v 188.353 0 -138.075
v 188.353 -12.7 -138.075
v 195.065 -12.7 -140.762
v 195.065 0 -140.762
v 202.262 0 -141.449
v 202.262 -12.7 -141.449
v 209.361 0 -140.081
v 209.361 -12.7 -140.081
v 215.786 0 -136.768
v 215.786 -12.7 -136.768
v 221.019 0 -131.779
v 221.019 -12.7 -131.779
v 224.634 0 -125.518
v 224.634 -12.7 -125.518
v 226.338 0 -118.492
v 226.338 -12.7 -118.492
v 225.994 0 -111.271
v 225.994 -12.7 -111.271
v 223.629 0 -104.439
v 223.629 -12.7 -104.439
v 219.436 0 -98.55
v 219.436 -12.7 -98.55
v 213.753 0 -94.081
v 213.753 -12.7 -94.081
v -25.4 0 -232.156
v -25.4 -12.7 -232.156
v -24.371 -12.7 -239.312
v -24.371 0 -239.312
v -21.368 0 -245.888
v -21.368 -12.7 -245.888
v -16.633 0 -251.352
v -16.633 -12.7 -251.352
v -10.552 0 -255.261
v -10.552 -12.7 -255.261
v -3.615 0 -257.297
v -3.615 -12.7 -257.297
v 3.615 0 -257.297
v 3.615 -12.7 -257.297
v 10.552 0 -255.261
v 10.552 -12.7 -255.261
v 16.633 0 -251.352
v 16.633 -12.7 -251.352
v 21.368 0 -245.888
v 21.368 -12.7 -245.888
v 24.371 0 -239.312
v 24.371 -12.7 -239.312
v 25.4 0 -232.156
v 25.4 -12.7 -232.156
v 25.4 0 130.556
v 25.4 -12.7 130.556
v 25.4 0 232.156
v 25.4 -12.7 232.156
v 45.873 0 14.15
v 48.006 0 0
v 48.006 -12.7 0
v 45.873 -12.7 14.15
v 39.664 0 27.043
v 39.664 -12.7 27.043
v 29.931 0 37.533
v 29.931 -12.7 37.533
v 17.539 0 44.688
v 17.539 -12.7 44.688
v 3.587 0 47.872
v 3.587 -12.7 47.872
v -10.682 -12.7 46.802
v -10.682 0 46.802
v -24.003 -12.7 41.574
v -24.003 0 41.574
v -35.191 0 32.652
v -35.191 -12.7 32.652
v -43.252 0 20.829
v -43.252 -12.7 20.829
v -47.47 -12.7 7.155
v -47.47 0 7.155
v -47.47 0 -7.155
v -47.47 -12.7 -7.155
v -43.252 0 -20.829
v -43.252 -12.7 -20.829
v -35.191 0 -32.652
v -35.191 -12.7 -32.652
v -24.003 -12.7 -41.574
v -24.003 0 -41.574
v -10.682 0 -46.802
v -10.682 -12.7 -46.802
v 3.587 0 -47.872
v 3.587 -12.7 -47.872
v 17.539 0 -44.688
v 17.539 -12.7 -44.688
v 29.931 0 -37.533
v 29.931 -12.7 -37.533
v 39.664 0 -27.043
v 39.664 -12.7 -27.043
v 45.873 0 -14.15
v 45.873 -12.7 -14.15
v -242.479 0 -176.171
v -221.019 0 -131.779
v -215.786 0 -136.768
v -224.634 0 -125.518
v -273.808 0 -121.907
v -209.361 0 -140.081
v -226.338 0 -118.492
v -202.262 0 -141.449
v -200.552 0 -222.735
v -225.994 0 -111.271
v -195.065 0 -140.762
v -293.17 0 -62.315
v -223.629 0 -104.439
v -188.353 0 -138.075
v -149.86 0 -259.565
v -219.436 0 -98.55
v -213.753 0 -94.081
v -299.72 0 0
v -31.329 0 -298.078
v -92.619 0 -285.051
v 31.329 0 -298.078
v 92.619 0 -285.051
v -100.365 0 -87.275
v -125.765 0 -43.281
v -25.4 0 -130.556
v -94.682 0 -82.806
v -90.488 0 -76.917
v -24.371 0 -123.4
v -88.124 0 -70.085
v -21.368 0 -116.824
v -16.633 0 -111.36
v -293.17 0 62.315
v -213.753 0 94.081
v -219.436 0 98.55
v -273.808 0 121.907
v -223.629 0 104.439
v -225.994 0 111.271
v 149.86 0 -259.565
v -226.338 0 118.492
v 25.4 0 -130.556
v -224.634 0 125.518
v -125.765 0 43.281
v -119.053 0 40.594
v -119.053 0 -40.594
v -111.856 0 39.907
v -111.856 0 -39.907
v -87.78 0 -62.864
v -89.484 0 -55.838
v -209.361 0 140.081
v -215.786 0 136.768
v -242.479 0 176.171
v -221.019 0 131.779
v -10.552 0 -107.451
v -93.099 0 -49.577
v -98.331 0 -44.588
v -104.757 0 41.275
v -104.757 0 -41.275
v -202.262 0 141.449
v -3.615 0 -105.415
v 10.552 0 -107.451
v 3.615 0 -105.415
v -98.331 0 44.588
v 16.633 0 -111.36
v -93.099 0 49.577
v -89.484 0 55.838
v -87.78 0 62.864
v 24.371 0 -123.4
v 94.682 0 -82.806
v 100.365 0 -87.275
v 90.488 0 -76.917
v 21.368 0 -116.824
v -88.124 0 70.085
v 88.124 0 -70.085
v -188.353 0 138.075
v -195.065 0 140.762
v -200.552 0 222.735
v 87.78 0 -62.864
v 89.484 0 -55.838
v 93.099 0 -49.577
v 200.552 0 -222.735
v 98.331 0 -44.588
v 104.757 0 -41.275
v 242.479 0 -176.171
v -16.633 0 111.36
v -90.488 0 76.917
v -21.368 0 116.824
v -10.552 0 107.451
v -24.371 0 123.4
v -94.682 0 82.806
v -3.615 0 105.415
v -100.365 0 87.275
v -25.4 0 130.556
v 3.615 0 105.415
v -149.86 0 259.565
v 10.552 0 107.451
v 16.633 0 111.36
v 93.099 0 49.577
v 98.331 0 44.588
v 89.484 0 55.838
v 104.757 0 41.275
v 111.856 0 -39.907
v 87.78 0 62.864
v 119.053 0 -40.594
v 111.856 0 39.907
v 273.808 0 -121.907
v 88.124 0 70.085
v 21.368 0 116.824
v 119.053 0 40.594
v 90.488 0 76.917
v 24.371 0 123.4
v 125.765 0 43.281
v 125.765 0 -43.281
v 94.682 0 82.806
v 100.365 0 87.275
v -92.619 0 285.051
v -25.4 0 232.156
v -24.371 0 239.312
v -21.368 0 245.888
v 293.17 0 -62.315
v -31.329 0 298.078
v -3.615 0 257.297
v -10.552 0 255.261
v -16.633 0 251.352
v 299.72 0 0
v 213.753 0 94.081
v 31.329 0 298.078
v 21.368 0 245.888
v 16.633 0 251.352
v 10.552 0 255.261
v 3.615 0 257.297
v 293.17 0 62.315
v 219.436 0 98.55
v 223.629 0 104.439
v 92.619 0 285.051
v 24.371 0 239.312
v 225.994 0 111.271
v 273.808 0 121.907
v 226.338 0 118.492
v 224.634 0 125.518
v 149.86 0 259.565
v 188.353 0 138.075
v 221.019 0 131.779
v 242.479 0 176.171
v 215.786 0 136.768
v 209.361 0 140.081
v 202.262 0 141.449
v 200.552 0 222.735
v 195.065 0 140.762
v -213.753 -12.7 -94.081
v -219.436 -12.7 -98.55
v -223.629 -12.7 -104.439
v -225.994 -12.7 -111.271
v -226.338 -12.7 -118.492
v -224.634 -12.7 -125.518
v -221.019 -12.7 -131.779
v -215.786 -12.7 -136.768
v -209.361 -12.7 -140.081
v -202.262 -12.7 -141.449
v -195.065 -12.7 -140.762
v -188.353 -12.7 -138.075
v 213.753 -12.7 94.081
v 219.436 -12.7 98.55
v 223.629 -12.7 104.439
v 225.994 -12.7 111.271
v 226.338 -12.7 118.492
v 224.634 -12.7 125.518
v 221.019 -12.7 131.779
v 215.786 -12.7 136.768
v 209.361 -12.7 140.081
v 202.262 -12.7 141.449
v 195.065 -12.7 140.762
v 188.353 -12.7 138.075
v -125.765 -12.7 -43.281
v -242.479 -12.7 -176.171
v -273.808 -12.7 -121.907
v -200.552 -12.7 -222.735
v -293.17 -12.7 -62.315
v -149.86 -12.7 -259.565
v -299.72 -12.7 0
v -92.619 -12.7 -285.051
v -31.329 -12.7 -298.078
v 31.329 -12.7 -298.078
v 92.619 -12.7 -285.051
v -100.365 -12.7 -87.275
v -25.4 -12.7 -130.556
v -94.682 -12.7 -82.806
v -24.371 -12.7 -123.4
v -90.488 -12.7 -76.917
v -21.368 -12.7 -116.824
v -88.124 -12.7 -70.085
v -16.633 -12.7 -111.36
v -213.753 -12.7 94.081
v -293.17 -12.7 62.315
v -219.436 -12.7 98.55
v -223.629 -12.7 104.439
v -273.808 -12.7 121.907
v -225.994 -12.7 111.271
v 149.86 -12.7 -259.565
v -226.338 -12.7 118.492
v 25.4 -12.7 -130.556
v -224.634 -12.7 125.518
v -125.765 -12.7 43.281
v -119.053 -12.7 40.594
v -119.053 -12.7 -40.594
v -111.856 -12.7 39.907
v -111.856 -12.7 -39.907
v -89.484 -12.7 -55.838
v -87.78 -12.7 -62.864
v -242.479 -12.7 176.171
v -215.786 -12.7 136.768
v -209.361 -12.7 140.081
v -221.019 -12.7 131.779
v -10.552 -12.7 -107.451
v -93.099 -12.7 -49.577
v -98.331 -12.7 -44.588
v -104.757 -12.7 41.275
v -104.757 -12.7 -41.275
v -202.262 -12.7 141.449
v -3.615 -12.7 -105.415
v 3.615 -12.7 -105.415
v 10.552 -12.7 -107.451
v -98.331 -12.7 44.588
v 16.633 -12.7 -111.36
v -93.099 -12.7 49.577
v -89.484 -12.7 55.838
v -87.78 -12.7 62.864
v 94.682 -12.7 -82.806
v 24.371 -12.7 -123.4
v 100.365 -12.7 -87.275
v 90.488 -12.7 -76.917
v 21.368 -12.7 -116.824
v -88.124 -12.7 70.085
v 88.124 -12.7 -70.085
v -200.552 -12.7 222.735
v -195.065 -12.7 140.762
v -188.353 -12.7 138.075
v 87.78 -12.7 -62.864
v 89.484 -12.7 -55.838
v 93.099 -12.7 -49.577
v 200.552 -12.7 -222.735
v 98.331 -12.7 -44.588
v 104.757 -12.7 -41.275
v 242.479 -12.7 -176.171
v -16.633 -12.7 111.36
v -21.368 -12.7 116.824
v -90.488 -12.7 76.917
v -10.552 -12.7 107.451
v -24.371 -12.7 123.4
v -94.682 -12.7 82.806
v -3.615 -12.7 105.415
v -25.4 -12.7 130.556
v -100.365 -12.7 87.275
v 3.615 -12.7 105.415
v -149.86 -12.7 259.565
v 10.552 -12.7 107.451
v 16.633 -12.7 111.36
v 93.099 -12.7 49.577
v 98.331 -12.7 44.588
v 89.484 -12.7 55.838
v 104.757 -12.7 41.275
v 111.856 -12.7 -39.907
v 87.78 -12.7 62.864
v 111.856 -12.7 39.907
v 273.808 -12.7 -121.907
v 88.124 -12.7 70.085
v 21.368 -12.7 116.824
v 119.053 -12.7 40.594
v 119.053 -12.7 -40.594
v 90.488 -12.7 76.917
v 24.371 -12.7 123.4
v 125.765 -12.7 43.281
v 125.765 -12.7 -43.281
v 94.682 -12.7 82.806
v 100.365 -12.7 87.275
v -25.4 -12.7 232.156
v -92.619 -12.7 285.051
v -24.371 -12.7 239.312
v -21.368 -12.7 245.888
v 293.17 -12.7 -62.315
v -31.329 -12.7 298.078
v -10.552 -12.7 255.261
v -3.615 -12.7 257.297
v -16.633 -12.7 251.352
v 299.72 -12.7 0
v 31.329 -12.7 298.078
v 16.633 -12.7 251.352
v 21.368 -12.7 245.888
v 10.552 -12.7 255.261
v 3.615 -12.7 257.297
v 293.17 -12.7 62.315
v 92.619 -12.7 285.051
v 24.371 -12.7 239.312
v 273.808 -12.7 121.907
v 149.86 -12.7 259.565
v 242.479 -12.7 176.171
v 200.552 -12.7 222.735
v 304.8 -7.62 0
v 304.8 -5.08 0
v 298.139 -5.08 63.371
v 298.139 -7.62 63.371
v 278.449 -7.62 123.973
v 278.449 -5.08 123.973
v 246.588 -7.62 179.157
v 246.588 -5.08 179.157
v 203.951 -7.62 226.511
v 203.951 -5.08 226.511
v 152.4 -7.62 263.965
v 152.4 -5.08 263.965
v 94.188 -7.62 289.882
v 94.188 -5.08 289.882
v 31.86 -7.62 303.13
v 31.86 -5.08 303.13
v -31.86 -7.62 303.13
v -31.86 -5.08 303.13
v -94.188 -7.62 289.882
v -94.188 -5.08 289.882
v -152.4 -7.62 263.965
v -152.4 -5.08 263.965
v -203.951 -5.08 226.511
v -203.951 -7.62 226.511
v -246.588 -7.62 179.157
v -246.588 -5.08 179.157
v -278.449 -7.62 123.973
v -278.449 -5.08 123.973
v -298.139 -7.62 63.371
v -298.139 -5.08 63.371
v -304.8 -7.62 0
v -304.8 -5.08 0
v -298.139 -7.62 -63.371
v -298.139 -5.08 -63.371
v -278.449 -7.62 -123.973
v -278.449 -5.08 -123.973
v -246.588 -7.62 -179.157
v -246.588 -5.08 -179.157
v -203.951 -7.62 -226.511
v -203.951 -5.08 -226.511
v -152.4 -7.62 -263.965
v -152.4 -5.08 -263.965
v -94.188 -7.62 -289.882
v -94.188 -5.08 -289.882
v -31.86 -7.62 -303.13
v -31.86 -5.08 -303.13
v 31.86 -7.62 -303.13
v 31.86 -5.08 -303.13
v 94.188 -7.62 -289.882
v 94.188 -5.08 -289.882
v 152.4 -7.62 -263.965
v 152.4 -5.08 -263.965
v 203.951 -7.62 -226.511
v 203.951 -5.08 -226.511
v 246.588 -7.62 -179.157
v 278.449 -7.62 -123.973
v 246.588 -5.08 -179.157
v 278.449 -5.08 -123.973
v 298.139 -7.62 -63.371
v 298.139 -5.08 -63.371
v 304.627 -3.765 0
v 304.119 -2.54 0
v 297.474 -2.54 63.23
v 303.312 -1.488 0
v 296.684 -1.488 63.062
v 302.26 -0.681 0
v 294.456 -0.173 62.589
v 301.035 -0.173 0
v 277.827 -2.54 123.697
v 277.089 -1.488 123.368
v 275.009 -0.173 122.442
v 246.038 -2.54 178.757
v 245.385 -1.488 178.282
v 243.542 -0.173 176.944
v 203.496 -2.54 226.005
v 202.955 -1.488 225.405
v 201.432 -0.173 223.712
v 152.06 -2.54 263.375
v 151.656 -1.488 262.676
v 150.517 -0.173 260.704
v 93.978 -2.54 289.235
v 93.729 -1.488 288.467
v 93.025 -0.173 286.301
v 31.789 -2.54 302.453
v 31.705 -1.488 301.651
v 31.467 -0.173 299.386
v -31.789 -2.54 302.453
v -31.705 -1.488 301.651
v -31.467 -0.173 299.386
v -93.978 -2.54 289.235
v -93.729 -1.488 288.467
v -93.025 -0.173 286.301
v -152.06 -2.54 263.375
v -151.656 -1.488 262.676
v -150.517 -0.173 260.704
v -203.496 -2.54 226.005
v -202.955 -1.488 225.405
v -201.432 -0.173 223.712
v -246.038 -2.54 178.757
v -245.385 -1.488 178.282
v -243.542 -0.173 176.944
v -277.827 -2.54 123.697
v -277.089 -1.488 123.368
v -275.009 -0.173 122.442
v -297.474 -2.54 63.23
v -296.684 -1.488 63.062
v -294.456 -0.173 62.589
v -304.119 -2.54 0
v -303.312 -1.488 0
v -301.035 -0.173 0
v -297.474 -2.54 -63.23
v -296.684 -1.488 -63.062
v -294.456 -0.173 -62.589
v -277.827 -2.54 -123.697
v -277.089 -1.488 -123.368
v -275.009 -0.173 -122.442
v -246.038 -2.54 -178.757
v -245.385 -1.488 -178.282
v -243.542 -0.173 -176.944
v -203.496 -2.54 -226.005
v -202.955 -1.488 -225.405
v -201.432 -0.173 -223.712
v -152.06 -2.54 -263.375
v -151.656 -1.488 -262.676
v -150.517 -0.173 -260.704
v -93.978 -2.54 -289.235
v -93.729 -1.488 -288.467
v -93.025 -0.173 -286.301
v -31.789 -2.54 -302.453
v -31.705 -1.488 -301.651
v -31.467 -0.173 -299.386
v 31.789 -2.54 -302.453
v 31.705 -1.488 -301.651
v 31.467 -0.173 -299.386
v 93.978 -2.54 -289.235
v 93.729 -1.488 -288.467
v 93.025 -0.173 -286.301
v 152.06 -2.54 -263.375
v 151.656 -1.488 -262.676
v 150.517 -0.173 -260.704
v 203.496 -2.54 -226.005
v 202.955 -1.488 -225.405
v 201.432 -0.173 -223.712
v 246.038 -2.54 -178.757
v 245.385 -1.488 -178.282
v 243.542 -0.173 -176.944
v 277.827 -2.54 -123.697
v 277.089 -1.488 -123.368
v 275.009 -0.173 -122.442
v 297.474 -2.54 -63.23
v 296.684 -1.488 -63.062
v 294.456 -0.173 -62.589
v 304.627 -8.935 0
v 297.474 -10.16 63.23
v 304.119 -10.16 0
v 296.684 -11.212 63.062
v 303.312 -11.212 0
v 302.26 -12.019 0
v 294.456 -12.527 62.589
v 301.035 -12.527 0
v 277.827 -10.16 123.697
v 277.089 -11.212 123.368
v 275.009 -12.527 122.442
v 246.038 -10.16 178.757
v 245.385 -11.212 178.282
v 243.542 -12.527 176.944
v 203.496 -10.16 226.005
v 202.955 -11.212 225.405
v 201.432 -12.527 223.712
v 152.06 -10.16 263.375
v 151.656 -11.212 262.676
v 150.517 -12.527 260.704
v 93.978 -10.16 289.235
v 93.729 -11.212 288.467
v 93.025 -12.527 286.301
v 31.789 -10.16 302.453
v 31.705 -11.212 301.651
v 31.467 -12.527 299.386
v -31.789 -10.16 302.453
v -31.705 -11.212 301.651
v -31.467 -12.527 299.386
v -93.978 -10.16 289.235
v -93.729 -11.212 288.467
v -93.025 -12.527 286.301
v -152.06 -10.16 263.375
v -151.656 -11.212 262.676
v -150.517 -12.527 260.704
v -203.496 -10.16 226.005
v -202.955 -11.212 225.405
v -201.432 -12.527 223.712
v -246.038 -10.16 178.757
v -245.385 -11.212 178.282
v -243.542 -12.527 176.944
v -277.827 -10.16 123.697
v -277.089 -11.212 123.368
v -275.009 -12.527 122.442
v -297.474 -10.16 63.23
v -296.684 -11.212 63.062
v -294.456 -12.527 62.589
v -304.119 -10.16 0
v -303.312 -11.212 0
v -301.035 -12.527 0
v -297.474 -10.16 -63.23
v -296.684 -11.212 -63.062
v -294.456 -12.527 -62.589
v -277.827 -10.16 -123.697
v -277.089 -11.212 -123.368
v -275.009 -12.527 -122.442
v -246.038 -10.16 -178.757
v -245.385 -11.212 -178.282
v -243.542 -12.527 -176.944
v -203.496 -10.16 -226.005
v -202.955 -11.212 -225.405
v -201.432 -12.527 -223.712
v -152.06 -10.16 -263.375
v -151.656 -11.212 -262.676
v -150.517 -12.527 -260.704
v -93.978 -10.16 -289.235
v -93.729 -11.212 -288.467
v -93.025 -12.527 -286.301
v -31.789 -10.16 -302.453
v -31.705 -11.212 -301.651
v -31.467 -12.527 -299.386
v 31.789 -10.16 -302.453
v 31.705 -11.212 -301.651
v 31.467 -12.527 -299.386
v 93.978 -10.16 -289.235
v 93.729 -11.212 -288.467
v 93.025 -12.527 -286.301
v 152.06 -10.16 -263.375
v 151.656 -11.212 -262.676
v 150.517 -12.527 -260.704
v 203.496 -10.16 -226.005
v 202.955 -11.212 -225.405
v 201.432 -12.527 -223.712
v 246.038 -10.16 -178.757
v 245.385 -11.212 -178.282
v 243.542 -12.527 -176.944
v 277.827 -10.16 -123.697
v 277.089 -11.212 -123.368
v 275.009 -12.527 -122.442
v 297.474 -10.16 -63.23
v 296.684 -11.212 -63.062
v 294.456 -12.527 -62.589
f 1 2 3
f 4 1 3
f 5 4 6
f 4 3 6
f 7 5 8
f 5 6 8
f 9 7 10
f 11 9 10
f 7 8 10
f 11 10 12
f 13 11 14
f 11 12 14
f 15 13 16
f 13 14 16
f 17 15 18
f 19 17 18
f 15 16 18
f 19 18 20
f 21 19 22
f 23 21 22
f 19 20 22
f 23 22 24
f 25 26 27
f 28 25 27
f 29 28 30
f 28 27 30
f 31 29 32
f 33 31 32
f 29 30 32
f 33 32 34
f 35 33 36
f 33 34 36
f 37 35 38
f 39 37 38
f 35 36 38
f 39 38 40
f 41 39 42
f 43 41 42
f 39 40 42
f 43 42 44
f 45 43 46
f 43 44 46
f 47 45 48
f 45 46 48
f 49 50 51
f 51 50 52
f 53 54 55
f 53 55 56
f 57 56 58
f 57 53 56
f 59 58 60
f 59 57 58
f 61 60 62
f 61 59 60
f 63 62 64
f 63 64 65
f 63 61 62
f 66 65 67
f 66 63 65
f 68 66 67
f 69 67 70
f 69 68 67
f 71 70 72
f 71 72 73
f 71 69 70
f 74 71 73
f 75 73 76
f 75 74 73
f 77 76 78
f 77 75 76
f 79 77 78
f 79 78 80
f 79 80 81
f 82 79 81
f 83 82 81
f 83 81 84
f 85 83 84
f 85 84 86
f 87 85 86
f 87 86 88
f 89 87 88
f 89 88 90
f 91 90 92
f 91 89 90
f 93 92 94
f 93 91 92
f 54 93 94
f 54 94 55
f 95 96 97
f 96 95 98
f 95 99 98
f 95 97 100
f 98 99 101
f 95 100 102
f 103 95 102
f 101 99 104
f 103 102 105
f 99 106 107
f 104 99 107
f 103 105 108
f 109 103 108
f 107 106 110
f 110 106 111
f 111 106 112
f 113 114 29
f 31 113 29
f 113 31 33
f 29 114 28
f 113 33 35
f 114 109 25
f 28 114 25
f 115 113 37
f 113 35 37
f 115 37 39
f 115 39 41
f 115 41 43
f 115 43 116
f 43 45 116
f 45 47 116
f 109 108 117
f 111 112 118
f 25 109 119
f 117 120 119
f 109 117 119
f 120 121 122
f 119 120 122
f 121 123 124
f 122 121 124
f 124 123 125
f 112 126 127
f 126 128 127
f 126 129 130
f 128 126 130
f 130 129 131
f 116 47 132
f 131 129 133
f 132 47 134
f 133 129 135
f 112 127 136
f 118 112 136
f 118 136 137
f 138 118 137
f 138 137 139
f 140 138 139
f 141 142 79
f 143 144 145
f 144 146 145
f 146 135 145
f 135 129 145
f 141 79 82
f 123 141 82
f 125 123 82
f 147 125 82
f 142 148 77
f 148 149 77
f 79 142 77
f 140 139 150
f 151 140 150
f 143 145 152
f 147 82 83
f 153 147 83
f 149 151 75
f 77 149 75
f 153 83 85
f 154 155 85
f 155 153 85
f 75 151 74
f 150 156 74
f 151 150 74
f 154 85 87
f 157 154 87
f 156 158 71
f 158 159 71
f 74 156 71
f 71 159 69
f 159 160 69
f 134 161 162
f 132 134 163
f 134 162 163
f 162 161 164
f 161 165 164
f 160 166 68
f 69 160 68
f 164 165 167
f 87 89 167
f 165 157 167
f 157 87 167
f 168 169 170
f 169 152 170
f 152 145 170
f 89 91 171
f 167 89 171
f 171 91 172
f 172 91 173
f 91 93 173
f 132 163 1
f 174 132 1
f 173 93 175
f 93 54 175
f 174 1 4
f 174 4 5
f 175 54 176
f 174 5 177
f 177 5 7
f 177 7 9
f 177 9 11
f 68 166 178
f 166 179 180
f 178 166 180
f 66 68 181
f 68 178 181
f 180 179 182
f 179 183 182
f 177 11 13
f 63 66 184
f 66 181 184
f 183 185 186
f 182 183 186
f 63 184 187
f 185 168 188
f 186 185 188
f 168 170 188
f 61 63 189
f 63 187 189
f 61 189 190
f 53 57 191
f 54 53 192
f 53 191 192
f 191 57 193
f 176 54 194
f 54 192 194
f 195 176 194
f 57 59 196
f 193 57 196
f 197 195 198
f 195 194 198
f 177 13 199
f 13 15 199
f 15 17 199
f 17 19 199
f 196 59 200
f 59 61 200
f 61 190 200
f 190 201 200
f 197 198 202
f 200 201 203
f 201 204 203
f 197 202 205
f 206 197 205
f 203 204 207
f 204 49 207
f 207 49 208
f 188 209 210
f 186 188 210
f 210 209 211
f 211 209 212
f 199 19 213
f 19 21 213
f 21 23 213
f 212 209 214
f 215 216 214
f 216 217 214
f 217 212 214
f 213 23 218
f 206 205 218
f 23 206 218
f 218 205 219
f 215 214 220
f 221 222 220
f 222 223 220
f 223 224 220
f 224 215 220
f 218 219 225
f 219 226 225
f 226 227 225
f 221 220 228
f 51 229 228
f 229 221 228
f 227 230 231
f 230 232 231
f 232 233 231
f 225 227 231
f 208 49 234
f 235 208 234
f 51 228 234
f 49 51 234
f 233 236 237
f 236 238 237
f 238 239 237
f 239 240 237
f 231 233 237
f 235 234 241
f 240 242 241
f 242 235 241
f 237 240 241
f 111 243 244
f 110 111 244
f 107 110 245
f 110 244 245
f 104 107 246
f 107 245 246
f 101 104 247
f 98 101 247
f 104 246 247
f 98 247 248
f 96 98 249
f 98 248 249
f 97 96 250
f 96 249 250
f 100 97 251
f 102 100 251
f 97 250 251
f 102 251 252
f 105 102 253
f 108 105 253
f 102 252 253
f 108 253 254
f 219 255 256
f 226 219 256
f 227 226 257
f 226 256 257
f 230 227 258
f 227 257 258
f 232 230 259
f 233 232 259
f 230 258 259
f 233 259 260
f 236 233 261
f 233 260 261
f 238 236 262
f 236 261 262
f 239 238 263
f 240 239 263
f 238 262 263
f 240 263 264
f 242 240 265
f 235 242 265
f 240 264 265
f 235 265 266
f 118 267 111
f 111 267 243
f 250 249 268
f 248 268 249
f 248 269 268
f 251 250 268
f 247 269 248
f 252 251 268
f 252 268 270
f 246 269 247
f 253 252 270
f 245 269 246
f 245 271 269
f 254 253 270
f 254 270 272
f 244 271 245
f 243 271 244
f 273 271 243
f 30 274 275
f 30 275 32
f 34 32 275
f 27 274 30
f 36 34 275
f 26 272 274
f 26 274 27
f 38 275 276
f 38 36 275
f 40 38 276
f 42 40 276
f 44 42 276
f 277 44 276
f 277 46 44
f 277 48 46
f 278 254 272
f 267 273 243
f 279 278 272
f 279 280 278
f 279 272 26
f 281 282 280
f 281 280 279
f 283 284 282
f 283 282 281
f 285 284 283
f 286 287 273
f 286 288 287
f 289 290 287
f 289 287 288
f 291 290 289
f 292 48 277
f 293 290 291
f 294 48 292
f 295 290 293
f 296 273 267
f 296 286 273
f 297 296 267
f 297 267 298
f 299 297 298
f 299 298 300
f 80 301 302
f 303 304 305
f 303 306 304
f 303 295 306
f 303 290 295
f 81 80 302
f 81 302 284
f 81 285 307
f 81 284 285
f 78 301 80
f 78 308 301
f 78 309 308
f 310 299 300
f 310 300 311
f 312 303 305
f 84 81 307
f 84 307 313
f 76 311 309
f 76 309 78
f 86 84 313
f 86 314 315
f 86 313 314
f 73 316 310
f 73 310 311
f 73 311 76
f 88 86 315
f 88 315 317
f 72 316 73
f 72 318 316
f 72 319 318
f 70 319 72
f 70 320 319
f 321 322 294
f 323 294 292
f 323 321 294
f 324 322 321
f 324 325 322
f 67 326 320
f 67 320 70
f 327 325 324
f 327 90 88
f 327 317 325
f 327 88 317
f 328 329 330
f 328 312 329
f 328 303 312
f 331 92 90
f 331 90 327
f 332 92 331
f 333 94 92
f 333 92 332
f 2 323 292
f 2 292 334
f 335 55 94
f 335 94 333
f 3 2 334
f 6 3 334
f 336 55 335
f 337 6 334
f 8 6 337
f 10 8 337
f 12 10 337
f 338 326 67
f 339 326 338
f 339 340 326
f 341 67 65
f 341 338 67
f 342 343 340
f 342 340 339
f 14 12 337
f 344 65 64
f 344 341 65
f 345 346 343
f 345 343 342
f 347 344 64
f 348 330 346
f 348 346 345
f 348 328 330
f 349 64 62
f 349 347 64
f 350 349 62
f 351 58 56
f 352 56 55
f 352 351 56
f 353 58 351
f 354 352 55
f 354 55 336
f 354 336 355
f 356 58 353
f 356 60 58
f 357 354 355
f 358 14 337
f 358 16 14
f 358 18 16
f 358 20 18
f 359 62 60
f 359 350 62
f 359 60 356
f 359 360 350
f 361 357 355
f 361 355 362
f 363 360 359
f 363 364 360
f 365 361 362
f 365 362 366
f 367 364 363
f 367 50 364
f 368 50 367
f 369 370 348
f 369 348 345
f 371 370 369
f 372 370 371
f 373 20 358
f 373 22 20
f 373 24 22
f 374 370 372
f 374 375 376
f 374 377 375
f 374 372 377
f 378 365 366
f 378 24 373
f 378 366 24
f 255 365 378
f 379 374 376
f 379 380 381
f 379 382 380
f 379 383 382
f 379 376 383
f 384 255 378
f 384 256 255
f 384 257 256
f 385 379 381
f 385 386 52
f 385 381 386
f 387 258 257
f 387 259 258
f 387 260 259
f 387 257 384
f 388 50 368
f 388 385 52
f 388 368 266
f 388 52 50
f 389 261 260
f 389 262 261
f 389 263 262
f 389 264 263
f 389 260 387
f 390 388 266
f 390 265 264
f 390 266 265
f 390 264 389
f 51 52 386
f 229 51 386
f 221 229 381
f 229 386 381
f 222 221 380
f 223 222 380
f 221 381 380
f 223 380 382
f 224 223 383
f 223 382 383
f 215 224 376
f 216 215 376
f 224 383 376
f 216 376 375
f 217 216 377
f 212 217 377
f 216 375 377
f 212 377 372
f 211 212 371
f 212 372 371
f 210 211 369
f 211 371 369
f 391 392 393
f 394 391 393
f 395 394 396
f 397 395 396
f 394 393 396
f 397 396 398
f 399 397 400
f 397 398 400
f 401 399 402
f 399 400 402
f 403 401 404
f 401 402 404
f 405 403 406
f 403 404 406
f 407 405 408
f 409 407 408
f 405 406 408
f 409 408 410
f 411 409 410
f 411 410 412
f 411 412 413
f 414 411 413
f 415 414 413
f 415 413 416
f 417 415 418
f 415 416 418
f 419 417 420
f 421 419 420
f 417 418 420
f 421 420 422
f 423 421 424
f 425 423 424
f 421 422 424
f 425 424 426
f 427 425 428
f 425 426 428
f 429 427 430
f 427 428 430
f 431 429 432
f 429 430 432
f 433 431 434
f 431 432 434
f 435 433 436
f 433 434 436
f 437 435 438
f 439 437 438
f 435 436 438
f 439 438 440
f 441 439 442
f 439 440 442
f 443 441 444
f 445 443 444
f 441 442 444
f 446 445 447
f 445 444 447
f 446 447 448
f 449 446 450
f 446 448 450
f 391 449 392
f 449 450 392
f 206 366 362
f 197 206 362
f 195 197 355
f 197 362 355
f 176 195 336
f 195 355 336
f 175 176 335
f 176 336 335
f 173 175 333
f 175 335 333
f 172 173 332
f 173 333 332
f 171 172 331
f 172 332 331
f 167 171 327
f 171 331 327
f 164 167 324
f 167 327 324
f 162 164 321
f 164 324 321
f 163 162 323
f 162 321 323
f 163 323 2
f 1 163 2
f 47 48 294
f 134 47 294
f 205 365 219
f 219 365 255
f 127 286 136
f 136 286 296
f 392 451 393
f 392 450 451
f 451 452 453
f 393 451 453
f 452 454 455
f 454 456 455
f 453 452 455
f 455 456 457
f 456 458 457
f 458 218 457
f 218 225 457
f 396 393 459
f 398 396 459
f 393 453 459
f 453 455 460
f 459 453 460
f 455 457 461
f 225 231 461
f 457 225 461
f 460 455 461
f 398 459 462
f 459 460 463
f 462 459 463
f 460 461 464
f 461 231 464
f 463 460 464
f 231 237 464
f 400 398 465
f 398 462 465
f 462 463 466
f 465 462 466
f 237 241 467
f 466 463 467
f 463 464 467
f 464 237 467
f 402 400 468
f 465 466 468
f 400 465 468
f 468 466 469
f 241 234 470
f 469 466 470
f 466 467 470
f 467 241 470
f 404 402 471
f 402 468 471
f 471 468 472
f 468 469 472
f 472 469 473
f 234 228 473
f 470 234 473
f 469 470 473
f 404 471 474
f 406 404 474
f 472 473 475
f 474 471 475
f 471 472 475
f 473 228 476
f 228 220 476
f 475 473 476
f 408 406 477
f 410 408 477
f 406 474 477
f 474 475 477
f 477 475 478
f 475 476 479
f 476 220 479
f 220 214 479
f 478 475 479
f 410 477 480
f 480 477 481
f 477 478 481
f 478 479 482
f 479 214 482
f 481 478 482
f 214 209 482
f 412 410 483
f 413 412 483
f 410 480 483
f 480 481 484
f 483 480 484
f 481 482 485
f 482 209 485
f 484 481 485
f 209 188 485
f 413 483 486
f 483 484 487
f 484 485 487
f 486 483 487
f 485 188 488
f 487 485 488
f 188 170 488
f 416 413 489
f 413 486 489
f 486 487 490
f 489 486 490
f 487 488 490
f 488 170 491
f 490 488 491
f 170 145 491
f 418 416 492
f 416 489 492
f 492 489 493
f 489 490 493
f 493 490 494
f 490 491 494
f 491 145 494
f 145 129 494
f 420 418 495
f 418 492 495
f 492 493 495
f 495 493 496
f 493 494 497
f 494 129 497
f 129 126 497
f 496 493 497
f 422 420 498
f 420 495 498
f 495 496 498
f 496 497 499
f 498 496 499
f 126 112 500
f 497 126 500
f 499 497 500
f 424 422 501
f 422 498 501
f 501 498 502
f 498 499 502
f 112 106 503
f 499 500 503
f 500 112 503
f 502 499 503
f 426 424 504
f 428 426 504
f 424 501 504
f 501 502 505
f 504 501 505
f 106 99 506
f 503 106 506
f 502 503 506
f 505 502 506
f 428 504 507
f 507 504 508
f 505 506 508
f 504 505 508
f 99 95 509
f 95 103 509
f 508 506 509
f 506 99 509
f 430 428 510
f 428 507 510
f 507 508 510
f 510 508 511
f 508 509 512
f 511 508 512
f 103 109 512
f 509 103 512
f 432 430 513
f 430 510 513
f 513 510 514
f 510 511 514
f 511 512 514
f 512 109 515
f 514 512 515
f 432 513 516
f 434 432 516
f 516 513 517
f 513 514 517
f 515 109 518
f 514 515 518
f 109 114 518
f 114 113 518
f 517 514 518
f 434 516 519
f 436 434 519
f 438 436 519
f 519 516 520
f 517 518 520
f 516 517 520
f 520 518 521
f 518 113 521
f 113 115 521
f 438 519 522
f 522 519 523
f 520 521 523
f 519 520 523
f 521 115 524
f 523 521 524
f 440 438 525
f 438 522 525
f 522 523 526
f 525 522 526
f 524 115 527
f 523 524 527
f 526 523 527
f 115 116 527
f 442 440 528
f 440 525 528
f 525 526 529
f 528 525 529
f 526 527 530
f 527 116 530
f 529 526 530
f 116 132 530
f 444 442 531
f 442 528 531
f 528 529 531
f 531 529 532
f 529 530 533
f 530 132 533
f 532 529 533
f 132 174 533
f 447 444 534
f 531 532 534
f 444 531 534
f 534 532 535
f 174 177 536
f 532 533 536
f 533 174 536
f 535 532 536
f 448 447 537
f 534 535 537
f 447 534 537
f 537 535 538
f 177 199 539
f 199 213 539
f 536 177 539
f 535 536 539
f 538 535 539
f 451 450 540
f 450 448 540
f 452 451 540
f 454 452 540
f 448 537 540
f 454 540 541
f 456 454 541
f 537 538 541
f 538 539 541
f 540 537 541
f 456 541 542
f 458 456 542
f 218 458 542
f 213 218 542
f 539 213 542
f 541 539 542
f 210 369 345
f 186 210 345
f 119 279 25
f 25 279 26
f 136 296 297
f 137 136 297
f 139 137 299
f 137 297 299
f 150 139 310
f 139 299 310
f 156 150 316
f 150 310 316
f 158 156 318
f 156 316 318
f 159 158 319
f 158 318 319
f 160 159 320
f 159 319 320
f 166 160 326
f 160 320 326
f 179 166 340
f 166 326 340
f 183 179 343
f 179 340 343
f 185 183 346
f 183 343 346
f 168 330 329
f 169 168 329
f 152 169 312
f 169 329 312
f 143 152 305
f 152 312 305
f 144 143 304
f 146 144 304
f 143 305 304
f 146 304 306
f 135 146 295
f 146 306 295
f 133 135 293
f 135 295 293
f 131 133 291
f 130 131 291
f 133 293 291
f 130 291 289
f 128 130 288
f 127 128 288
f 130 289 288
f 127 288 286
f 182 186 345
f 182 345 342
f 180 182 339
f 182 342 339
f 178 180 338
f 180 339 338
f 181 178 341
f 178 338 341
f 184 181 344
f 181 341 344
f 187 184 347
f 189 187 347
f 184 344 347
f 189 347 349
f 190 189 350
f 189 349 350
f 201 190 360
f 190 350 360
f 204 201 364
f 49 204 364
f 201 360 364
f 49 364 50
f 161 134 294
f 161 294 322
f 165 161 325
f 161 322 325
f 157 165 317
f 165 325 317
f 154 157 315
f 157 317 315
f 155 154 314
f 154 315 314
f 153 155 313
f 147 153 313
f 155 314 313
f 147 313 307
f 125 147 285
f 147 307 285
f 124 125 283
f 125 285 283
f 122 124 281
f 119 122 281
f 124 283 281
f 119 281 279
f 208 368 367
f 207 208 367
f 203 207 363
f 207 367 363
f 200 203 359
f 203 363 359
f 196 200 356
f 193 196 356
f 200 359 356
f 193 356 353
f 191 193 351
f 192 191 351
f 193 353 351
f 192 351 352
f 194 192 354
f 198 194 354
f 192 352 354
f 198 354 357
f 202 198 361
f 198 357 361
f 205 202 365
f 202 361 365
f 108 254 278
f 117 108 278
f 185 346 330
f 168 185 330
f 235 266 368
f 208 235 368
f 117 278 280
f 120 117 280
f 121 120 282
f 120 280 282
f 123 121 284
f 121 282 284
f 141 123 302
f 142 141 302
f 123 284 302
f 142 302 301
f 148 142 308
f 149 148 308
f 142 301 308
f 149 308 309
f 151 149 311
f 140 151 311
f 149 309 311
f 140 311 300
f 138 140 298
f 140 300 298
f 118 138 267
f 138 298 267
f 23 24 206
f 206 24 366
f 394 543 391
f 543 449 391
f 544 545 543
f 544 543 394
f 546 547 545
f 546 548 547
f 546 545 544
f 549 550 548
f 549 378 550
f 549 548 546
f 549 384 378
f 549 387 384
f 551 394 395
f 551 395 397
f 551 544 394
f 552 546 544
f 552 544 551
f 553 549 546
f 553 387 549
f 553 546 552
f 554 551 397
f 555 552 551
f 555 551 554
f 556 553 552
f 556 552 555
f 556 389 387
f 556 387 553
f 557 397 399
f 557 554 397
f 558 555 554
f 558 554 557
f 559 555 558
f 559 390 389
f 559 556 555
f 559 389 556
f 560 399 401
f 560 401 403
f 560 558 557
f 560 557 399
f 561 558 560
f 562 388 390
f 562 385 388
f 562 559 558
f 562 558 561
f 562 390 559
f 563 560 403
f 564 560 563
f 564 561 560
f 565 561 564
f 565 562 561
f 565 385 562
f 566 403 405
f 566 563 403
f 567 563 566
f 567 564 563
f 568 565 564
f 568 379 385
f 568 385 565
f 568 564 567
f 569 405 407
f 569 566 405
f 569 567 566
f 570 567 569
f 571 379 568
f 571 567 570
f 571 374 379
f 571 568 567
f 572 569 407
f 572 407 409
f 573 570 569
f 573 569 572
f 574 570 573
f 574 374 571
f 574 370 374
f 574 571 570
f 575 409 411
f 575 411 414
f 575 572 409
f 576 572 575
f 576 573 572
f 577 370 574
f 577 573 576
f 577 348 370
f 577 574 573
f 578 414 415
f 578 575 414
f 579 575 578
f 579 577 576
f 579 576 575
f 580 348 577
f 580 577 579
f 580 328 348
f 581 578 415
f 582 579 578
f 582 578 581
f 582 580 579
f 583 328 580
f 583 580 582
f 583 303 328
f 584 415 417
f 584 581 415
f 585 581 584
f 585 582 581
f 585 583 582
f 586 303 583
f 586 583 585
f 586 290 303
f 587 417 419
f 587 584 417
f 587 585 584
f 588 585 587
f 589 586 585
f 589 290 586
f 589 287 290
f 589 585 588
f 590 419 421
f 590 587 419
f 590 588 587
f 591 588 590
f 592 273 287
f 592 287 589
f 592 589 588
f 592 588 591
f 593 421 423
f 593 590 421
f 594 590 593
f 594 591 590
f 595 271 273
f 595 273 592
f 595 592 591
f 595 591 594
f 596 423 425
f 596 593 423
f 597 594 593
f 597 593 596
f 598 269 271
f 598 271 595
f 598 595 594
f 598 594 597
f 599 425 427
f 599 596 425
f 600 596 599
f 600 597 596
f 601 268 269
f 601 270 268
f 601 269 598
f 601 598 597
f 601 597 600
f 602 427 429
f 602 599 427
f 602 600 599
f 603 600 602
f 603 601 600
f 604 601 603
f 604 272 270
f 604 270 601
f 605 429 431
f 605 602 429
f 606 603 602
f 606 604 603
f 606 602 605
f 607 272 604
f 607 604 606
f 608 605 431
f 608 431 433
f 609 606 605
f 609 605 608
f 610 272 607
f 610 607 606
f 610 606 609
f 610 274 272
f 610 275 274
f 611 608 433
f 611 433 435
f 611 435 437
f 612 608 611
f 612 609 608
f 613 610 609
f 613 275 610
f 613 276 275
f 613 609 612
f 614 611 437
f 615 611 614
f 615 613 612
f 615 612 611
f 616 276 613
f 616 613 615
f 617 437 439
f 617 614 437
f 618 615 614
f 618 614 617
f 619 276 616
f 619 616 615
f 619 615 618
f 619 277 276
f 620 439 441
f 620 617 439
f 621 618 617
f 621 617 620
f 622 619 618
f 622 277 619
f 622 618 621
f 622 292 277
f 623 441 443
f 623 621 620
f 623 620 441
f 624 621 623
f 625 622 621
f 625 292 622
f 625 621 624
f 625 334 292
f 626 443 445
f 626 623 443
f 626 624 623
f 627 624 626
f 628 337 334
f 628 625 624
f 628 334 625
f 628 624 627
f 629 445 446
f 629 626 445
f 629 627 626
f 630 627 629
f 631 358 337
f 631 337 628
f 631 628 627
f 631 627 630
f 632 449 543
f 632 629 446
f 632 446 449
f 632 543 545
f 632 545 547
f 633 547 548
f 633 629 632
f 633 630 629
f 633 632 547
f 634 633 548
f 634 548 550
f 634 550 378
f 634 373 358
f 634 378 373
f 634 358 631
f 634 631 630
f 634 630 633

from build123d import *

# Parameters (mm, degrees)
F0_R     = 304.8
F0_R_2   = 48.006
F1_DEPTH = 12.7
F3_DEPTH = 12.701
F4_R     = 5.08


with BuildPart() as f1:
    # F0 (on Front) → F1 (new body)
    with BuildSketch(Plane.XZ):
        Circle(F0_R)
        Circle(F0_R_2, mode=Mode.SUBTRACT)
    extrude(amount=F1_DEPTH)

    # F2 (on face) → F3 (cut, through all)
    with BuildSketch(Plane.XZ.offset(12.7)):
        with BuildLine():
            Line((-25.4, 232.156), (-25.4, 130.556))
            ThreePointArc((-25.4, 130.556), (0, 105.156), (25.4, 130.556))
            Line((25.4, 130.556), (25.4, 232.156))
            ThreePointArc((25.4, 232.156), (0, 257.556), (-25.4, 232.156))
        make_face()
        with BuildLine():
            Line((188.352994, 138.075045), (100.364813, 87.275045))
            ThreePointArc((100.364813, 87.275045), (91.067767, 52.578), (125.764813, 43.280955))
            Line((125.764813, 43.280955), (213.752994, 94.080955))
            ThreePointArc((213.752994, 94.080955), (223.050039, 128.778), (188.352994, 138.075045))
        make_face()
        with BuildLine():
            Line((213.752994, -94.080955), (125.764813, -43.280955))
            ThreePointArc((125.764813, -43.280955), (91.067767, -52.578), (100.364813, -87.275045))
            Line((100.364813, -87.275045), (188.352994, -138.075045))
            ThreePointArc((188.352994, -138.075045), (223.050039, -128.778), (213.752994, -94.080955))
        make_face()
        with BuildLine():
            Line((25.4, -232.156), (25.4, -130.556))
            ThreePointArc((25.4, -130.556), (0, -105.156), (-25.4, -130.556))
            Line((-25.4, -130.556), (-25.4, -232.156))
            ThreePointArc((-25.4, -232.156), (0, -257.556), (25.4, -232.156))
        make_face()
        with BuildLine():
            Line((-188.352994, -138.075045), (-100.364813, -87.275045))
            ThreePointArc((-100.364813, -87.275045), (-91.067767, -52.578), (-125.764813, -43.280955))
            Line((-125.764813, -43.280955), (-213.752994, -94.080955))
            ThreePointArc((-213.752994, -94.080955), (-223.050039, -128.778), (-188.352994, -138.075045))
        make_face()
        with BuildLine():
            Line((-213.752994, 94.080955), (-125.764813, 43.280955))
            ThreePointArc((-125.764813, 43.280955), (-91.067767, 52.578), (-100.364813, 87.275045))
            Line((-100.364813, 87.275045), (-188.352994, 138.075045))
            ThreePointArc((-188.352994, 138.075045), (-223.050039, 128.778), (-213.752994, 94.080955))
        make_face()
    extrude(amount=-F3_DEPTH, mode=Mode.SUBTRACT)

    # F4
    f4_edges = [f1.edges().sort_by_distance(p)[0] for p in [
        (-304.8, 0, 0),
        (-304.8, -12.7, 0),
    ]]
    fillet(f4_edges, radius=F4_R)


solid = f1.part
